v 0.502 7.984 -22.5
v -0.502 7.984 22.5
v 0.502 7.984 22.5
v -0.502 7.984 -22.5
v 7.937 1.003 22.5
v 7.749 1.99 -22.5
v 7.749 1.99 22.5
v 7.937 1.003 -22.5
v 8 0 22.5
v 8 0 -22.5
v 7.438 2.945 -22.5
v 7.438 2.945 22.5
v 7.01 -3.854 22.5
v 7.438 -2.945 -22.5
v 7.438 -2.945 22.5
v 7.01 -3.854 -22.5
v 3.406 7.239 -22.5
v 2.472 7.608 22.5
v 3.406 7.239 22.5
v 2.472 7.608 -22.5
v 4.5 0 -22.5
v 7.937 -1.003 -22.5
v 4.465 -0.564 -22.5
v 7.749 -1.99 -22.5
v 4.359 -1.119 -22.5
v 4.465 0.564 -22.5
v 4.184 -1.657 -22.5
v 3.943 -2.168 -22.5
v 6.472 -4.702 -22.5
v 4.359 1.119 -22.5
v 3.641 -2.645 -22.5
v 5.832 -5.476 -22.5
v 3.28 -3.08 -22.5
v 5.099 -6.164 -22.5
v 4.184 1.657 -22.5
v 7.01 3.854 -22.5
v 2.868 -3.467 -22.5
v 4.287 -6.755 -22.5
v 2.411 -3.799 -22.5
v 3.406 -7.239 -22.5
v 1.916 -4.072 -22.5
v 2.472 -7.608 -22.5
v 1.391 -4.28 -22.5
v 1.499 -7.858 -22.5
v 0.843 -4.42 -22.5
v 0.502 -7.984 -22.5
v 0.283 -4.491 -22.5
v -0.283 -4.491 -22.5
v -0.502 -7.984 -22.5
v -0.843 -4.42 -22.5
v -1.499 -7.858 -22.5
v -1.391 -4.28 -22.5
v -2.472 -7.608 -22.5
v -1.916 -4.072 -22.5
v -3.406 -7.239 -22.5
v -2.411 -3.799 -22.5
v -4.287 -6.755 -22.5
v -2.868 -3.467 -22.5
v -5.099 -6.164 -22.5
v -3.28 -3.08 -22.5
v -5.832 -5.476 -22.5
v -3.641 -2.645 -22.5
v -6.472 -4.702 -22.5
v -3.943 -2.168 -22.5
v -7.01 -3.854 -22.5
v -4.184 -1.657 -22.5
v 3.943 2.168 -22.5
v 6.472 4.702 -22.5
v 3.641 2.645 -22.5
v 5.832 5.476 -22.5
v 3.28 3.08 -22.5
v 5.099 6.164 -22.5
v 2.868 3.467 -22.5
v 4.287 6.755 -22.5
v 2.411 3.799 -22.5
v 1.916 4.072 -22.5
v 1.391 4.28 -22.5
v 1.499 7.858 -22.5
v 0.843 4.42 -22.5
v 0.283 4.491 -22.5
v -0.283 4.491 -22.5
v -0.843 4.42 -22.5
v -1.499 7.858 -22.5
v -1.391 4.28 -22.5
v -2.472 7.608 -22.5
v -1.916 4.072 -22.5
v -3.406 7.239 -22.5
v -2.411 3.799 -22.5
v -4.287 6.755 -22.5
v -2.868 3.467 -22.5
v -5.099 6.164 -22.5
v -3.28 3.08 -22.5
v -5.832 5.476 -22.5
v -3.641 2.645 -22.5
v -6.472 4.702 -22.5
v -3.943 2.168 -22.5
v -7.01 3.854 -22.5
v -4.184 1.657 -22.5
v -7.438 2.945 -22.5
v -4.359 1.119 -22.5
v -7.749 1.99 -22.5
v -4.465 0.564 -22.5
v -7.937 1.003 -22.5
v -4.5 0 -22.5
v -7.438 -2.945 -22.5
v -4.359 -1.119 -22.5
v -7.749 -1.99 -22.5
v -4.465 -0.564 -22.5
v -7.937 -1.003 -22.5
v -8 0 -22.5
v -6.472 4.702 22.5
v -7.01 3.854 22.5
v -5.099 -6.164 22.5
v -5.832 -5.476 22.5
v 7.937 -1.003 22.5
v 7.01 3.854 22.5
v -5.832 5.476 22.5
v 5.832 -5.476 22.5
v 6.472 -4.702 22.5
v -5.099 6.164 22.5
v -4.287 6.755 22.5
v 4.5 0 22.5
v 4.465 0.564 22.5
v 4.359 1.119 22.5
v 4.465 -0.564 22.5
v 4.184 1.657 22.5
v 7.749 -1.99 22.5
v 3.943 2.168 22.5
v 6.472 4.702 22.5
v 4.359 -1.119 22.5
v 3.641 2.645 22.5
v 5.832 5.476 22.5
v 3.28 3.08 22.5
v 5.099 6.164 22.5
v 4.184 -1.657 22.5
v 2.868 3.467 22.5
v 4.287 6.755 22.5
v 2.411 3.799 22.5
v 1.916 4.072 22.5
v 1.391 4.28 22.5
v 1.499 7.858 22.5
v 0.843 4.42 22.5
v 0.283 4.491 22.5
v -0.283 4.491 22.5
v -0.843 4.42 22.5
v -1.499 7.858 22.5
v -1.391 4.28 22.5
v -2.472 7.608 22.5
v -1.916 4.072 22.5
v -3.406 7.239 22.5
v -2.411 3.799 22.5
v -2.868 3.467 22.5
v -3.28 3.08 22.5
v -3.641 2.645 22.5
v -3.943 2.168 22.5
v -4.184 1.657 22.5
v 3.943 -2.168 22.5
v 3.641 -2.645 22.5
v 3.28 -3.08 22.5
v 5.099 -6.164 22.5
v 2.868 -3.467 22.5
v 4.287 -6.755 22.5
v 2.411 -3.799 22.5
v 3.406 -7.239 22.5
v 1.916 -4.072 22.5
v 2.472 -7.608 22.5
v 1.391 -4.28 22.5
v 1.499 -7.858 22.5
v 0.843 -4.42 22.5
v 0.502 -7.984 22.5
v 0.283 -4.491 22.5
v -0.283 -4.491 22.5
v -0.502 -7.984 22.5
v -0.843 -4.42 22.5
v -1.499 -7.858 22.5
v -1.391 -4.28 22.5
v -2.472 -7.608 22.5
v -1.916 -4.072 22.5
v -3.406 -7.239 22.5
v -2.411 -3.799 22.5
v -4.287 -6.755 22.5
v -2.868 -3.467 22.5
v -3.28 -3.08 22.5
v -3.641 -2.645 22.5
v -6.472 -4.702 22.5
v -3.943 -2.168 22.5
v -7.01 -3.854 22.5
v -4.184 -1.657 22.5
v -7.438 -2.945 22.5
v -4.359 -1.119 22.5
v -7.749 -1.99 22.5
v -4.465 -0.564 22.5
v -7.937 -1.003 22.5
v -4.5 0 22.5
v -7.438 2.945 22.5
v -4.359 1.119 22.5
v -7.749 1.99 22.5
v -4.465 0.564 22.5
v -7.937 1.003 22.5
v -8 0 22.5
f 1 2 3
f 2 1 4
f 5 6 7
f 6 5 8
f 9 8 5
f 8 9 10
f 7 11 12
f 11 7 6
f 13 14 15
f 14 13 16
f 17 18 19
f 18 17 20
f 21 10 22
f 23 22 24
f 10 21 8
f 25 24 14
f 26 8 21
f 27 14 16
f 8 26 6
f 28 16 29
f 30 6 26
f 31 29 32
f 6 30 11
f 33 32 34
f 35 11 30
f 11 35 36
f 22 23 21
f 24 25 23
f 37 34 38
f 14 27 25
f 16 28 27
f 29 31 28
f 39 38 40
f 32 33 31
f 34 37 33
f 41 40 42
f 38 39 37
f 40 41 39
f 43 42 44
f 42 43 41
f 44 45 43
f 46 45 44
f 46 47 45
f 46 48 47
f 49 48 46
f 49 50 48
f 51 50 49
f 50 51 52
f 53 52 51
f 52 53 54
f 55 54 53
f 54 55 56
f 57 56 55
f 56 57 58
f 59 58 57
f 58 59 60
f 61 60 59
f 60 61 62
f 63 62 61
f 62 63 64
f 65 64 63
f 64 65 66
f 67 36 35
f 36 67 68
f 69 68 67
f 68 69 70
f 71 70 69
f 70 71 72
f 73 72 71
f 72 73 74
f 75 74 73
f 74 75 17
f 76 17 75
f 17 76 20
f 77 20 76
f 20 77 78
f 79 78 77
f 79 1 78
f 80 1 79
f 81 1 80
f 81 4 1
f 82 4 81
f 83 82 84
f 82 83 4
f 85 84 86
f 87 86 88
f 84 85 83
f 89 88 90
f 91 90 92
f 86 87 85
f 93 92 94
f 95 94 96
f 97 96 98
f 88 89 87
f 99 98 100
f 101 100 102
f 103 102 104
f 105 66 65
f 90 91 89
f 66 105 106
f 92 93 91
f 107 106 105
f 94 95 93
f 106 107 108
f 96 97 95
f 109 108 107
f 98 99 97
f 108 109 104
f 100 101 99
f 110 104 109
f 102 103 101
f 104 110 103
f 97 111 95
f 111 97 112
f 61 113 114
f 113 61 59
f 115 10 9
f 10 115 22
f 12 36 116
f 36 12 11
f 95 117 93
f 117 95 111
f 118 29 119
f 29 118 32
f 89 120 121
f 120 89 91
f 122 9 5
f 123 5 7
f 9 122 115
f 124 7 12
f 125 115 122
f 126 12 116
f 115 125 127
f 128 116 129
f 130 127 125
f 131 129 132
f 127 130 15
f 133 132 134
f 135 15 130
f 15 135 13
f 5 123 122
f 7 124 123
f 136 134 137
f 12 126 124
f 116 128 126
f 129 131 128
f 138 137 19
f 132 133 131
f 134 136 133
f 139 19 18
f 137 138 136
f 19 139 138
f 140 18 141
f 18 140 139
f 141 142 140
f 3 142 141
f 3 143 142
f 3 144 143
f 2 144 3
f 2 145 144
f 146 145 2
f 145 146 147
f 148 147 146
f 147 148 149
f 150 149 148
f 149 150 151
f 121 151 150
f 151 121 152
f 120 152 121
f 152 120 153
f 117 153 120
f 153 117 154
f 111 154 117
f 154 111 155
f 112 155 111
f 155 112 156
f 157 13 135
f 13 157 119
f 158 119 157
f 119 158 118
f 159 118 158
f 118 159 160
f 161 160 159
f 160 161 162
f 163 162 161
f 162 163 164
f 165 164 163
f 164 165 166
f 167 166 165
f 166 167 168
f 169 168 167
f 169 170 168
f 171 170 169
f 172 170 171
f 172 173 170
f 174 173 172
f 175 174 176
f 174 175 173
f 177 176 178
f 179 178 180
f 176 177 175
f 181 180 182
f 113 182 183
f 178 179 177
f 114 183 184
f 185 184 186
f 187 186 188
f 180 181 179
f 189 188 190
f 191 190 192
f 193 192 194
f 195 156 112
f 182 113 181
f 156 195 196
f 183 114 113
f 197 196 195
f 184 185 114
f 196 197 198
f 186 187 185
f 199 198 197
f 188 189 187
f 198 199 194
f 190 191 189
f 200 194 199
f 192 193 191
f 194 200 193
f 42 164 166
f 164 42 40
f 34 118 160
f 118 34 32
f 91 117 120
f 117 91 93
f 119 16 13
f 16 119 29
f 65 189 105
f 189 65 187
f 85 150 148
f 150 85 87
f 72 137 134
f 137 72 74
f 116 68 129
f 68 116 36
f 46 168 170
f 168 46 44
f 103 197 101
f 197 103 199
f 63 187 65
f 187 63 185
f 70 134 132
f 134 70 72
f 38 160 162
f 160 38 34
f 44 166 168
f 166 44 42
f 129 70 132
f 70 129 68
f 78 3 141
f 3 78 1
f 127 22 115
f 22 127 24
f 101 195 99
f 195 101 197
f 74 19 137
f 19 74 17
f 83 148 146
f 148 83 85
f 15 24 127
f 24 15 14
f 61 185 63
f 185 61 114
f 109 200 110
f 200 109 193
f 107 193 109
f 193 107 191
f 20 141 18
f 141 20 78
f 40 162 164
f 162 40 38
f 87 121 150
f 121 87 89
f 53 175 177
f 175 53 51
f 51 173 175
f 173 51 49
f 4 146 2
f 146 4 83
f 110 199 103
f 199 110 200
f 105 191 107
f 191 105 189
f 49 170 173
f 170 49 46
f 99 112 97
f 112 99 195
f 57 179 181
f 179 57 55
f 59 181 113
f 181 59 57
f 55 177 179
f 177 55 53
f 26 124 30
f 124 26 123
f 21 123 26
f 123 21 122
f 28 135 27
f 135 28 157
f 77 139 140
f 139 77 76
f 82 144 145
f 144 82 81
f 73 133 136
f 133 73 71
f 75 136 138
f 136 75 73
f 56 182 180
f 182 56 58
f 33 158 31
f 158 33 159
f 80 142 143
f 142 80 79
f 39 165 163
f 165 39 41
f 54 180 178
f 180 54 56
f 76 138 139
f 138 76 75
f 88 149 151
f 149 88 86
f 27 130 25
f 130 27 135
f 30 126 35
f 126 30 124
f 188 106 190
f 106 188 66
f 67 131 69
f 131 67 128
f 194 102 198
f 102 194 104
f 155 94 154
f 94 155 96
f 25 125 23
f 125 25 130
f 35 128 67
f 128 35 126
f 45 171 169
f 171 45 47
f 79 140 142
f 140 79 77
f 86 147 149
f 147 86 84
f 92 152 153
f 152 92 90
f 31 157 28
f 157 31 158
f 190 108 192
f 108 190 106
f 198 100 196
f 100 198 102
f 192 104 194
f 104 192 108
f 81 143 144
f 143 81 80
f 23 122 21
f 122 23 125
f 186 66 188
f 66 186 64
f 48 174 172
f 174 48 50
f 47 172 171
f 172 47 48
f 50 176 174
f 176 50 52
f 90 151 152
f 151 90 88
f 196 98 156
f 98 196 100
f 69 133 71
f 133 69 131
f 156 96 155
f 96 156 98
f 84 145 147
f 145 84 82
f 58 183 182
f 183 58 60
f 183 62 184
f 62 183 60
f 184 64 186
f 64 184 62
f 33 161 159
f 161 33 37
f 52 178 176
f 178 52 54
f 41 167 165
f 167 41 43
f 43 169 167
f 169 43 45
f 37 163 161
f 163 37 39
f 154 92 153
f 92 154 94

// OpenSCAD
$fn = 50;


difference() {
	union() {
		translate(v = [0, 0, -22.5000000000]) {
			cylinder(h = 45, r = 8.0000000000);
		}
	}
	union() {
		translate(v = [0, 0, -100.0000000000]) {
			cylinder(h = 200, r = 4.5000000000);
		}
	}
}
